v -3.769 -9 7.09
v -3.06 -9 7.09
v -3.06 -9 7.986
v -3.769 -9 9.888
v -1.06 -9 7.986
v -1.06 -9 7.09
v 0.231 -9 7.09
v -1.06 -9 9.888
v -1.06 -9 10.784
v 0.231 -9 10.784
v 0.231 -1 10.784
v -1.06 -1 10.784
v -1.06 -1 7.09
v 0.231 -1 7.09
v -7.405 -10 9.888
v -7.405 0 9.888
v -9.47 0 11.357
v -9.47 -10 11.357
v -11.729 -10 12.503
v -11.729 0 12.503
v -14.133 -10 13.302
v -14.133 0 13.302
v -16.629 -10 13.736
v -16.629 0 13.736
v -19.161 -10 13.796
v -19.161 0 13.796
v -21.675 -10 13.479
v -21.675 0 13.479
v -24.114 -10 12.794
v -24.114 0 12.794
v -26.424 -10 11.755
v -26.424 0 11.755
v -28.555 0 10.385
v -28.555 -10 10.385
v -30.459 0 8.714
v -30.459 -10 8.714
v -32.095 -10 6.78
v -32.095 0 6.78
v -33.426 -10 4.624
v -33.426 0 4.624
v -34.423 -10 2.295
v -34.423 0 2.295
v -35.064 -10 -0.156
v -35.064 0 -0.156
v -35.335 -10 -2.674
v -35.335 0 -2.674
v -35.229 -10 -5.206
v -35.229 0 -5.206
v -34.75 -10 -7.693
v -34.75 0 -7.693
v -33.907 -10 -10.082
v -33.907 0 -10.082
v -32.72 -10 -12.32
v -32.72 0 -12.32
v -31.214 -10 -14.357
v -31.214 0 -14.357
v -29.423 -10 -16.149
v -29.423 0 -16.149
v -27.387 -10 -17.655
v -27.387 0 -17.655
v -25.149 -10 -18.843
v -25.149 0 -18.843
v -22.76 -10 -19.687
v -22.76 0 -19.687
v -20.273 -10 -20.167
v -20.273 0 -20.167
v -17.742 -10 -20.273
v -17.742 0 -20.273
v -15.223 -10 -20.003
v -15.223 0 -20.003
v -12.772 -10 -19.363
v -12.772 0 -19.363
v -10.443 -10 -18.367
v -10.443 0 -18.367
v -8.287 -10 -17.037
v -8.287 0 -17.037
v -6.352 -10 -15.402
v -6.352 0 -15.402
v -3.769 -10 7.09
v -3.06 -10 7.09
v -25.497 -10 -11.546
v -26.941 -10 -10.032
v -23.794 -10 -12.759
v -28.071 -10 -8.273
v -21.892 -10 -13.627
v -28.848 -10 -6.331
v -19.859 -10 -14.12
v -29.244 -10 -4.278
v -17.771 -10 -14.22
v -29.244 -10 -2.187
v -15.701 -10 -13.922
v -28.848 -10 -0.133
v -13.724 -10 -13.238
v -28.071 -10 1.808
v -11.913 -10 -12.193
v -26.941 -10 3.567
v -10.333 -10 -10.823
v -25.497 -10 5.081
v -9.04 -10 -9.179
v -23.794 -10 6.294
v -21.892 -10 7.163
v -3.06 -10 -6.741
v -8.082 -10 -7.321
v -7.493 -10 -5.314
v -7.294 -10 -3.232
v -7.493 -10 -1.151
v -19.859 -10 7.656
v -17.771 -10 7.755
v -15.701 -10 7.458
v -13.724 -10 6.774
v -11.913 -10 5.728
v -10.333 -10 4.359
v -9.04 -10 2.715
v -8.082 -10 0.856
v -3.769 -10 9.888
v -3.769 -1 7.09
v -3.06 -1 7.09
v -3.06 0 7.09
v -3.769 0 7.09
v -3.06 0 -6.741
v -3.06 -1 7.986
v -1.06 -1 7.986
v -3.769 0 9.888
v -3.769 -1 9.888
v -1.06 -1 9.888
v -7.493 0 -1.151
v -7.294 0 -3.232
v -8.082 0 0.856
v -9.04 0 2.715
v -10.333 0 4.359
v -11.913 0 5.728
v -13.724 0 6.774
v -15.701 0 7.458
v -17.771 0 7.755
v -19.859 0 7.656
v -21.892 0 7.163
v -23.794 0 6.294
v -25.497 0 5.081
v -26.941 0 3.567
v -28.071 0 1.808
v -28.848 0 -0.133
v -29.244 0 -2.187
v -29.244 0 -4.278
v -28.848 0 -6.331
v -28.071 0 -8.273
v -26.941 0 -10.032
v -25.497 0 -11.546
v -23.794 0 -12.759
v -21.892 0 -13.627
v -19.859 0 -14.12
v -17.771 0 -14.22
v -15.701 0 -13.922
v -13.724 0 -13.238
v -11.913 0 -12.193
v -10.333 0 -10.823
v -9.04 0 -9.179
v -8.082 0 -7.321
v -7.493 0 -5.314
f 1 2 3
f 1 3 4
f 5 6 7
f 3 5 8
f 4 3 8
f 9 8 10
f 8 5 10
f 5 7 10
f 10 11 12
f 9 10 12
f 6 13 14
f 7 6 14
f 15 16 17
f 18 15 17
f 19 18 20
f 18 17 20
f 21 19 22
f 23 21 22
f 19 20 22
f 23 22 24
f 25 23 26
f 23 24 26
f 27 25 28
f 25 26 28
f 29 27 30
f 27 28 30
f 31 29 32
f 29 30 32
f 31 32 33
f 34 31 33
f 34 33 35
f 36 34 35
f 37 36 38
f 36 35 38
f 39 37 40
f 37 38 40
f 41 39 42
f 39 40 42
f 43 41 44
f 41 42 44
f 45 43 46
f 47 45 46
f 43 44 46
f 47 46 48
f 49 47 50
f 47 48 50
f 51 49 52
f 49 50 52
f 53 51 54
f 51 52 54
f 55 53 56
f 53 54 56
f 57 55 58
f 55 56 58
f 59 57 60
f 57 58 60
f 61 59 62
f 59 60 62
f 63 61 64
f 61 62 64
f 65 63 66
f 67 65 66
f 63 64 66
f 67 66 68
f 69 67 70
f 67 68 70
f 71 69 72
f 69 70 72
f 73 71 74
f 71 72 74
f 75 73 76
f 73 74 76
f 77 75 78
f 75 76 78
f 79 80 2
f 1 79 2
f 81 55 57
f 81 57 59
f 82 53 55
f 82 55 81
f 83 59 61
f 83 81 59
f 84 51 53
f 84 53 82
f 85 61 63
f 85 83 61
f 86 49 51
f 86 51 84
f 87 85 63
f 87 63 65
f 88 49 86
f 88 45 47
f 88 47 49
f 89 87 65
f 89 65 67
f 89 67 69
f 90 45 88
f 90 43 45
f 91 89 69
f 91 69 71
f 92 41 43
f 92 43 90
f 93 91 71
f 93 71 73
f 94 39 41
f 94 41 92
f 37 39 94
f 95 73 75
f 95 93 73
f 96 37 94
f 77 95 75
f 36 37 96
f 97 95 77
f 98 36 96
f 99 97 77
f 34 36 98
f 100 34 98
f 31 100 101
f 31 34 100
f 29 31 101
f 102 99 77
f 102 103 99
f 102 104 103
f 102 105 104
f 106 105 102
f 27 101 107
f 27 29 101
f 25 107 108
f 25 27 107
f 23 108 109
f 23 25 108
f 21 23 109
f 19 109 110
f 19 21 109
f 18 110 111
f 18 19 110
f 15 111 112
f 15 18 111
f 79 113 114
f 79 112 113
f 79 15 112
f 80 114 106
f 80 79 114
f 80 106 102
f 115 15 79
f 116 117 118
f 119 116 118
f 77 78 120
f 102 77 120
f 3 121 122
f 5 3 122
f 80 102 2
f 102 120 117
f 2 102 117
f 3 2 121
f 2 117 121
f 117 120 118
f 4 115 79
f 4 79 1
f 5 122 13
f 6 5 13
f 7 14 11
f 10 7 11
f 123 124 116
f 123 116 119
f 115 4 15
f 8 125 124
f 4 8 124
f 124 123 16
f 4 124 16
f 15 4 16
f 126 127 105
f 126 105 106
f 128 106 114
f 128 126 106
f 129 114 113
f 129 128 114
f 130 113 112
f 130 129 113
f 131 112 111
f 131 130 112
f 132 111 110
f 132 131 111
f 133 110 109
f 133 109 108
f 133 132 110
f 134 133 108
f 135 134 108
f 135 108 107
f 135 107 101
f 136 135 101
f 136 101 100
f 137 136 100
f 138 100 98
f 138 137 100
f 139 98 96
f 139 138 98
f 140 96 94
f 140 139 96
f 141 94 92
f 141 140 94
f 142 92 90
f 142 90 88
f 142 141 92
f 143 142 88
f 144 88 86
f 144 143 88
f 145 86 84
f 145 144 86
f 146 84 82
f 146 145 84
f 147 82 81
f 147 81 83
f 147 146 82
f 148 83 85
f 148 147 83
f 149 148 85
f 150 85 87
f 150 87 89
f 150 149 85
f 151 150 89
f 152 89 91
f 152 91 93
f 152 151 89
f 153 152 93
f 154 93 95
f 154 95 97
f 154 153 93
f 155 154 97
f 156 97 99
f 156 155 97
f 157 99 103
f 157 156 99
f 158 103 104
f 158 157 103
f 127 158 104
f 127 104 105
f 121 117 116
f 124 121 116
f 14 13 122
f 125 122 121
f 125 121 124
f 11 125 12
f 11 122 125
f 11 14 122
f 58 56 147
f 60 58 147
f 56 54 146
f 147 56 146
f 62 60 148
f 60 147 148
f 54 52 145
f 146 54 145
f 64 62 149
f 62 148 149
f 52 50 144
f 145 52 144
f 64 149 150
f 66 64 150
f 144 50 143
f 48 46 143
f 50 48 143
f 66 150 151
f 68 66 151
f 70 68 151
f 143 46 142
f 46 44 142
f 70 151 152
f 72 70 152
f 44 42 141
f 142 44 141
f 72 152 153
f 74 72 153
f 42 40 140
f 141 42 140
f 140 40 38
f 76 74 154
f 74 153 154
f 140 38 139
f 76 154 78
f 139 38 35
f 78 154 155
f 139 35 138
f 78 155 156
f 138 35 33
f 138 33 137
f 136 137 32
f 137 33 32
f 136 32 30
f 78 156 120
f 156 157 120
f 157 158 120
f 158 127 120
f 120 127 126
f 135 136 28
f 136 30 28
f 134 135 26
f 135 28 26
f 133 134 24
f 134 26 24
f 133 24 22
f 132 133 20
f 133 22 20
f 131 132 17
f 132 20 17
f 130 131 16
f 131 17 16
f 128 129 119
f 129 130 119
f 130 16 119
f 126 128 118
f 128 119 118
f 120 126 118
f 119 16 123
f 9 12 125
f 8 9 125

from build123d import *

# Parameters (mm, degrees)
F0_R     = 11
F1_DEPTH = 10
F2_W     = 1
F2_H     = 3.693367015
F3_DEPTH = 4


with BuildPart() as f1:
    # F0 (on Front) → F1 (new body)
    with BuildSketch(Plane.XZ):
        with BuildLine():
            Line((-3.0604514879, 9.8880870564), (-7.4054963655, 9.8880870564))
            ThreePointArc((-7.4054963655, 9.8880870564), (-35.3291650939, -3.9419436711), (-6.351978263, -15.4015976163))
            Line((-6.351978263, -15.4015976163), (-3.0604514879, -6.7412075195))
            Line((-3.0604514879, -6.7412075195), (-3.0604514879, 3.9817849485))
            Line((-3.0604514879, 3.9817849485), (-3.0604514879, 7.9859482356))
            Line((-3.0604514879, 7.9859482356), (-3.0604514879, 9.8880870564))
        make_face()
        with Locations((-18.2939400691, -3.2322899852)):
            Circle(F0_R, mode=Mode.SUBTRACT)
        Polygon((-1.0604514879, 9.8880870564), (-3.0604514879, 9.8880870564), (-3.0604514879, 7.9859482356), (-1.0604514879, 7.9859482356), (-1.0604514879, 7.0903341385), (0.2310752873, 7.0903341385), (0.2310752873, 10.7837011535), (-1.0604514879, 10.7837011535), align=None)
    extrude(amount=F1_DEPTH)

    # F2 (on face) → F3 (cut)
    with BuildSketch(Plane.YZ.offset(0.2310752873)):
        with Locations((-9.5, 8.937017646)):
            Rectangle(F2_W, F2_H)
        with Locations((-0.5, 8.937017646)):
            Rectangle(F2_W, F2_H)
    extrude(amount=-F3_DEPTH, mode=Mode.SUBTRACT)


solid = f1.part
